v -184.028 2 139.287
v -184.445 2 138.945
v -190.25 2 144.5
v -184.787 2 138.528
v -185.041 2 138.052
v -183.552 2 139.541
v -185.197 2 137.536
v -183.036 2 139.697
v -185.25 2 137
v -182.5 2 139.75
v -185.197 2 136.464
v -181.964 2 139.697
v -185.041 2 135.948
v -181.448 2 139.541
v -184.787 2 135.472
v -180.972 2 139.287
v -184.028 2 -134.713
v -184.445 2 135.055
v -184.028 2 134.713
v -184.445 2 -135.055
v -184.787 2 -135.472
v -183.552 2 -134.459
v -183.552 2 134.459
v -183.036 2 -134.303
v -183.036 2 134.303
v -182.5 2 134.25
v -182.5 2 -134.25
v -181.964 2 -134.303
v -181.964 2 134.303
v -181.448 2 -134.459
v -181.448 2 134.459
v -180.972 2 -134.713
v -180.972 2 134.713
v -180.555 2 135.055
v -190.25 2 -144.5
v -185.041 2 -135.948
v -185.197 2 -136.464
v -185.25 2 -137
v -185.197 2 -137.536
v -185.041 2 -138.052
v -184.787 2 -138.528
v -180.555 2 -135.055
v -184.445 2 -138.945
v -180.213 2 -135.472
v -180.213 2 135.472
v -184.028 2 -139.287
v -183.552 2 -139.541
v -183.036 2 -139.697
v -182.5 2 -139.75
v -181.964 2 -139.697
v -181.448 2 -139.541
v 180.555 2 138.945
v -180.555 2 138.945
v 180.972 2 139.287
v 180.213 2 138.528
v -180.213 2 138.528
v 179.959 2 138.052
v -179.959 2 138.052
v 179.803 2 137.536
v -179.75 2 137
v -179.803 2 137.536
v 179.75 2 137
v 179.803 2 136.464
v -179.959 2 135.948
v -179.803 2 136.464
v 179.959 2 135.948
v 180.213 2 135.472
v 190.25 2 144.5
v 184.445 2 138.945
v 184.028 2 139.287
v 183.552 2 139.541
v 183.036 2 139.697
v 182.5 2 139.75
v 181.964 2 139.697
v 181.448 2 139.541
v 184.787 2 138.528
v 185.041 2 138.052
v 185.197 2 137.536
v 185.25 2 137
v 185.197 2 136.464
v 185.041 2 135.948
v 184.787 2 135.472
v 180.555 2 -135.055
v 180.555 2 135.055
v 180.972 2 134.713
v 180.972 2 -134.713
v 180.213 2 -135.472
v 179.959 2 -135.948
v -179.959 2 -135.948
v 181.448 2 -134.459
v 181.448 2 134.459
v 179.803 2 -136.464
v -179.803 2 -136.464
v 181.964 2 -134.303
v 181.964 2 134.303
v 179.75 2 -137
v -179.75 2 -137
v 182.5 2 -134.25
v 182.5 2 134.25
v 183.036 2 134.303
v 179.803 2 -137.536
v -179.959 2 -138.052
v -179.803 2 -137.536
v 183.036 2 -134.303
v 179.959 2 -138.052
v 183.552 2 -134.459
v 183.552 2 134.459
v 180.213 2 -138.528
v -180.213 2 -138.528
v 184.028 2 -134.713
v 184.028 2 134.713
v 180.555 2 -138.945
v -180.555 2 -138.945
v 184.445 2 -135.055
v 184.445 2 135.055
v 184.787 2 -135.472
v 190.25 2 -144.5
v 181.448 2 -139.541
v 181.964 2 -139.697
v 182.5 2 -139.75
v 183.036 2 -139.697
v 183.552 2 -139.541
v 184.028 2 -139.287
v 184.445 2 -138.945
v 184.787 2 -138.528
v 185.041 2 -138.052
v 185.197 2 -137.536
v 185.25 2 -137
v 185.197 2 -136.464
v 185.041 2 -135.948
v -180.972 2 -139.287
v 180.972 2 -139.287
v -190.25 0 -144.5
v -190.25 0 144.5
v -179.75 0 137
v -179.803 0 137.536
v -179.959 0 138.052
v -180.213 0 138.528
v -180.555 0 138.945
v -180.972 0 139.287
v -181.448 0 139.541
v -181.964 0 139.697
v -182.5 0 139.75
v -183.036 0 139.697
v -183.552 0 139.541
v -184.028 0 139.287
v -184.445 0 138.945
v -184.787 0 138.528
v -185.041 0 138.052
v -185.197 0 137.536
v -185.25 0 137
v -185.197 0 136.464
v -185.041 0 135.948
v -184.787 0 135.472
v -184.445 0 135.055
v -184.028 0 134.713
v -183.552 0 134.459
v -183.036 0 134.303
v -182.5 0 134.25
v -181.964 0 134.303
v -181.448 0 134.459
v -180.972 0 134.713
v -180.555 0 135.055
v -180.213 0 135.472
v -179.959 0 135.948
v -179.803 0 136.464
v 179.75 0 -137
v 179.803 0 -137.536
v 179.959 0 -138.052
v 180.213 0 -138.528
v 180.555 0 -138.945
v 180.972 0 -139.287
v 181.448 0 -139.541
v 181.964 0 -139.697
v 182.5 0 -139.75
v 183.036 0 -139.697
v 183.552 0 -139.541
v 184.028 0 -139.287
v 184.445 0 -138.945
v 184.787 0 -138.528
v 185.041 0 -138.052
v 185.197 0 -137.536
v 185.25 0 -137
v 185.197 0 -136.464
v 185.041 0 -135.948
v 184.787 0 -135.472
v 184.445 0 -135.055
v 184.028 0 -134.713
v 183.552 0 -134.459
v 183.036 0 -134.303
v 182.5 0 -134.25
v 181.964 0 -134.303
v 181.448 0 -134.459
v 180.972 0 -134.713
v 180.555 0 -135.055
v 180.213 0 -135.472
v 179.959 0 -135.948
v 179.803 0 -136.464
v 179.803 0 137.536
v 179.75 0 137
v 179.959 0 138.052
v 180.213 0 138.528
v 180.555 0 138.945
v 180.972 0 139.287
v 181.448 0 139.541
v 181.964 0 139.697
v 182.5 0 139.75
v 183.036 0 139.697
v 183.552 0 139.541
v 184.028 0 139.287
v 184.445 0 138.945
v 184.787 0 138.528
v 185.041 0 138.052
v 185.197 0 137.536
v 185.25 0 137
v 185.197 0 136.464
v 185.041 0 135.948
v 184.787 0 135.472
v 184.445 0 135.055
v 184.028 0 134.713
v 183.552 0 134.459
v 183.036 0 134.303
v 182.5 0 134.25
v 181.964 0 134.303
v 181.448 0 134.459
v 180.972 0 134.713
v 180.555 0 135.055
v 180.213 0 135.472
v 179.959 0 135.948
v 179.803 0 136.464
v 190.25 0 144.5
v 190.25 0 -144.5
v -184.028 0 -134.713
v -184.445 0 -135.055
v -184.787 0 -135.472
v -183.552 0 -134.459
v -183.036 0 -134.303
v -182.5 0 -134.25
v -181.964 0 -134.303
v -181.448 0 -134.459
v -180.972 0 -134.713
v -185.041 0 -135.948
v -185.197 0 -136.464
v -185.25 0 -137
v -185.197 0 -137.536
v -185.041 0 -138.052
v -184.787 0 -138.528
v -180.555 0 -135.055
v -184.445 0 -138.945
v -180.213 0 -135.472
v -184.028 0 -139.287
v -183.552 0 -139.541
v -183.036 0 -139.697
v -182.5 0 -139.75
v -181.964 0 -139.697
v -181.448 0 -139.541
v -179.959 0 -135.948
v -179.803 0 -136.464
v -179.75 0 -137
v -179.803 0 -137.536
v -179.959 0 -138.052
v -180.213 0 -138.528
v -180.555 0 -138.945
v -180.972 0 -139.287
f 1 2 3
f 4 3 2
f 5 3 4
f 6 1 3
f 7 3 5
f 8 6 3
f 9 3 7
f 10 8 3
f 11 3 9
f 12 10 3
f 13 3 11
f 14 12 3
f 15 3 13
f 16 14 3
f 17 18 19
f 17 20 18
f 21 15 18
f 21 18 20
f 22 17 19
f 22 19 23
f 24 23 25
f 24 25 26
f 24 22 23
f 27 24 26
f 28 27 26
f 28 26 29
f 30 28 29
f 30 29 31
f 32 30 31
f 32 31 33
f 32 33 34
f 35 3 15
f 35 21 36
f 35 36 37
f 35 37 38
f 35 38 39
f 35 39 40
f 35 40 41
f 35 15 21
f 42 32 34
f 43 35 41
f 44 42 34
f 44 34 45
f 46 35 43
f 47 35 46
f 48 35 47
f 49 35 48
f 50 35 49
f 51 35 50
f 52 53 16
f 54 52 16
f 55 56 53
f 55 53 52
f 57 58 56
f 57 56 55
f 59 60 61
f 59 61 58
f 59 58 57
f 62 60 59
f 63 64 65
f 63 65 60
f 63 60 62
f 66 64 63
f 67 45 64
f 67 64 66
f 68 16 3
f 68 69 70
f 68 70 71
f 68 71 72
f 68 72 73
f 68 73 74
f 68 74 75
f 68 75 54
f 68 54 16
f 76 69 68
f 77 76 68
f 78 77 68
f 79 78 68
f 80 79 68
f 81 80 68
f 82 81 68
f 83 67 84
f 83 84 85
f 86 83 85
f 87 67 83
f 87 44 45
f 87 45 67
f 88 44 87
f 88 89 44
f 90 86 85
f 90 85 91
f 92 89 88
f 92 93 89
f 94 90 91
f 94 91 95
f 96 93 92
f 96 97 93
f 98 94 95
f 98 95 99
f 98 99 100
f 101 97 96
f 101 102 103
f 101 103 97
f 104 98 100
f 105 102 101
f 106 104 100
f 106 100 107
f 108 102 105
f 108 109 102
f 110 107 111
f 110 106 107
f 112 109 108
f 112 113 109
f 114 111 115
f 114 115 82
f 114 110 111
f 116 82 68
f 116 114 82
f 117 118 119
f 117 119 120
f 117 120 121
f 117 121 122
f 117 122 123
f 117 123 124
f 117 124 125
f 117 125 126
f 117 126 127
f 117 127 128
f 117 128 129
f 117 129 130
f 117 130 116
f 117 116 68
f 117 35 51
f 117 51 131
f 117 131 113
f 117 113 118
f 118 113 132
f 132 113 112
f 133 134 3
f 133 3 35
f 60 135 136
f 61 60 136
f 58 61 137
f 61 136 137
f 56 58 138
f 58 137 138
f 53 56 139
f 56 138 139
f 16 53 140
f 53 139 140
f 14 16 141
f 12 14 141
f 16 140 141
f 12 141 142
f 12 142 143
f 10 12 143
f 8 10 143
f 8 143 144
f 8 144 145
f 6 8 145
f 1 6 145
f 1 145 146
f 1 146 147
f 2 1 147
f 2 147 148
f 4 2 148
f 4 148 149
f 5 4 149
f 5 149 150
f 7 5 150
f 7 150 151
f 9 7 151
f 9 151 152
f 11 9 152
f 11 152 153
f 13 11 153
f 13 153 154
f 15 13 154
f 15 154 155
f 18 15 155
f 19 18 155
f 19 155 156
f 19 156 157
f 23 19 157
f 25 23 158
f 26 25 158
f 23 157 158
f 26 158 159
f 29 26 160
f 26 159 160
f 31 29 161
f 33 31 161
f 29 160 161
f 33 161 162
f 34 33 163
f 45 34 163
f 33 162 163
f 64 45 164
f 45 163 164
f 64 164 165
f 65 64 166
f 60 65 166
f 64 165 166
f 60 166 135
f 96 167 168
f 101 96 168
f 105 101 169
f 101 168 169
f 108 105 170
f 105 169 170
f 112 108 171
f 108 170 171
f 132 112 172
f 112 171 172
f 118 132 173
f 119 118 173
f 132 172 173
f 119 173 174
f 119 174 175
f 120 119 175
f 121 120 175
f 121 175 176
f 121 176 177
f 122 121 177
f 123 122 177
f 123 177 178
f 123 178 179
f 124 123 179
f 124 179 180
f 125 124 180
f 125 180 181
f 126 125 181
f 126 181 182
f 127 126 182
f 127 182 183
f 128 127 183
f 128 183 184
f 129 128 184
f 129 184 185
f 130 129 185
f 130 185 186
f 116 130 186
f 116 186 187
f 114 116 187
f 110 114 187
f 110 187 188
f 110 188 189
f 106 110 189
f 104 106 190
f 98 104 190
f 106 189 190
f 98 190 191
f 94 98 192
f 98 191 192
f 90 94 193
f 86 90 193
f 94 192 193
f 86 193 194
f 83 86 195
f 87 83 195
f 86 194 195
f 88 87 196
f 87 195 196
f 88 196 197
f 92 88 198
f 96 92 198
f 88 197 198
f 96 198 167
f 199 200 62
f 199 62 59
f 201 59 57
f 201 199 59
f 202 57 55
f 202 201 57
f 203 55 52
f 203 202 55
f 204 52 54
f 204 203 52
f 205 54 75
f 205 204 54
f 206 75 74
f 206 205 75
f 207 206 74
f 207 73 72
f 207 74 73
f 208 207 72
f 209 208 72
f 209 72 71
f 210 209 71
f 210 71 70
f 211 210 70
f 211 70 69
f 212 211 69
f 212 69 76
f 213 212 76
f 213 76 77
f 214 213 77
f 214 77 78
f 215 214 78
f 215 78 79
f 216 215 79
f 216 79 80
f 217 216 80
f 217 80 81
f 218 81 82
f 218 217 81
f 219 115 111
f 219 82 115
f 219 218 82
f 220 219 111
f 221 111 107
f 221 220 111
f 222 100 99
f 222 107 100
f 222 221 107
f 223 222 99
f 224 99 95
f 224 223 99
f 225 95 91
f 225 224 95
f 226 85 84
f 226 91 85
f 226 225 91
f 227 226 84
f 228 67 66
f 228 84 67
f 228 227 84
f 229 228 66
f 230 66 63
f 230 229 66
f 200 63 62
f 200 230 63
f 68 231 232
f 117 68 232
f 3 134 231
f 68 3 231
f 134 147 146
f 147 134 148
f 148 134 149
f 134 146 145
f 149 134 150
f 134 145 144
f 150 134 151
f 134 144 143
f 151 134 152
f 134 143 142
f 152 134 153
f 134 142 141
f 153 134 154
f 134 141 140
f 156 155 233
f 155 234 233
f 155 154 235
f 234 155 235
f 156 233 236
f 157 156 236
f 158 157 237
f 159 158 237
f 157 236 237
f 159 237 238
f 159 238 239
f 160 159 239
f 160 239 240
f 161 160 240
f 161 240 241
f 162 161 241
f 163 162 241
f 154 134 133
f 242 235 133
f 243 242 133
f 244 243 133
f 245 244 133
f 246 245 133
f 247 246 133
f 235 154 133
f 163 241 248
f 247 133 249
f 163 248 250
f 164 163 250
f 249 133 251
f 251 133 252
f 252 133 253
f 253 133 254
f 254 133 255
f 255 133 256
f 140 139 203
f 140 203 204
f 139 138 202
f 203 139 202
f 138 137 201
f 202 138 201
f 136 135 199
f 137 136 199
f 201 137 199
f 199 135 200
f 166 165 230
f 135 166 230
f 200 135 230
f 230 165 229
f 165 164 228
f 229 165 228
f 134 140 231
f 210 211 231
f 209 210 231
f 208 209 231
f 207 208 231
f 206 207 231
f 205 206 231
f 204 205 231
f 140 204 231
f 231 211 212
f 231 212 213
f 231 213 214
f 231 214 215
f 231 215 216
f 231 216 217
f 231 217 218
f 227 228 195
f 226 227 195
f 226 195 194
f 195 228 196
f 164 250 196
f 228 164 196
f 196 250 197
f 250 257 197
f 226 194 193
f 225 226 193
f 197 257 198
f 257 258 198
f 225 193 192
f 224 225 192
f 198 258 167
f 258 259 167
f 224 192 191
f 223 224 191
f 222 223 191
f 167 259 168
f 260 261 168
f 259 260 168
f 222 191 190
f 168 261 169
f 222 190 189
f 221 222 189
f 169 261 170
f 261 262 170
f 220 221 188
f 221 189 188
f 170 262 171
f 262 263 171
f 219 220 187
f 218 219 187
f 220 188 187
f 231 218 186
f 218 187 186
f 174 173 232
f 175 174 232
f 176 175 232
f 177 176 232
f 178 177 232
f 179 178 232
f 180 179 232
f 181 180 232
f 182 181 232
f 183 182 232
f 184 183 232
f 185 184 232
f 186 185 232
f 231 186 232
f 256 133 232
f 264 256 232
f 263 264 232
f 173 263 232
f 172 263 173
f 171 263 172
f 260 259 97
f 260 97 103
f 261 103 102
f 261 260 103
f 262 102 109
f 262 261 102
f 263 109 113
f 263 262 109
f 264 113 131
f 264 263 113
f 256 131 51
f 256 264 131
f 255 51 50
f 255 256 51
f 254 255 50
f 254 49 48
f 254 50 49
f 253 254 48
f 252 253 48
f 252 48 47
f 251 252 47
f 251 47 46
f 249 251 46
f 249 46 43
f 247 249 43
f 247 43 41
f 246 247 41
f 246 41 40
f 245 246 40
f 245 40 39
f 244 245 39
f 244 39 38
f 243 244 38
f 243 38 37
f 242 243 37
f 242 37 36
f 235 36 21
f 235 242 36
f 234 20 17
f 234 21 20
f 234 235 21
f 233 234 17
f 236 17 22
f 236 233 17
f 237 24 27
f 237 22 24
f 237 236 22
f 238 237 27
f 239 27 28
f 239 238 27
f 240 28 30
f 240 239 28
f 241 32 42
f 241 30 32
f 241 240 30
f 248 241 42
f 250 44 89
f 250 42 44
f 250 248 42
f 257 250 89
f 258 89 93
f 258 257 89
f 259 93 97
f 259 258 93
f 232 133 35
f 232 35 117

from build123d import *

# Parameters (mm, degrees)
SKETCH9_W            = 380.5
SKETCH9_H            = 289
BOSS_EXTRUDE2_DEPTH  = 2
M5_CLEARANCE_HOLE1_D = 5.5
MIRROR2_COPY_1_D     = 5.5


with BuildPart() as part:
    # Sketch9 → Boss-Extrude2 (new body)
    with BuildSketch(Plane(origin=(0, 0, 0), x_dir=(1, 0, 0), z_dir=(0, 1, 0))):
        Rectangle(SKETCH9_W, SKETCH9_H)
    extrude(amount=BOSS_EXTRUDE2_DEPTH)

    # M5 Clearance Hole1 (through all)
    with Locations(Plane(origin=(0, 2, 0), x_dir=(1, 0, 0), z_dir=(0, 1, 0))):
        with Locations((182.5, 137)):
            m5_clearance_hole1 = Hole(M5_CLEARANCE_HOLE1_D / 2)

    # Mirror1: M5 Clearance Hole1 across plane
    add(m5_clearance_hole1.mirror(Plane.XY), mode=Mode.SUBTRACT)

    # Mirror2: M5 Clearance Hole1 across plane
    add(m5_clearance_hole1.mirror(Plane(origin=(0, 0, 0), x_dir=(0, 0, 1), z_dir=(1, 0, 0))), mode=Mode.SUBTRACT)

    # Mirror2 copy 1 (through all)
    with Locations(Plane(origin=(0, 2, 0), x_dir=(-1, 0, 0), z_dir=(0, 1, 0))):
        with Locations((182.5, 137)):
            Hole(MIRROR2_COPY_1_D / 2)


solid = part.part
